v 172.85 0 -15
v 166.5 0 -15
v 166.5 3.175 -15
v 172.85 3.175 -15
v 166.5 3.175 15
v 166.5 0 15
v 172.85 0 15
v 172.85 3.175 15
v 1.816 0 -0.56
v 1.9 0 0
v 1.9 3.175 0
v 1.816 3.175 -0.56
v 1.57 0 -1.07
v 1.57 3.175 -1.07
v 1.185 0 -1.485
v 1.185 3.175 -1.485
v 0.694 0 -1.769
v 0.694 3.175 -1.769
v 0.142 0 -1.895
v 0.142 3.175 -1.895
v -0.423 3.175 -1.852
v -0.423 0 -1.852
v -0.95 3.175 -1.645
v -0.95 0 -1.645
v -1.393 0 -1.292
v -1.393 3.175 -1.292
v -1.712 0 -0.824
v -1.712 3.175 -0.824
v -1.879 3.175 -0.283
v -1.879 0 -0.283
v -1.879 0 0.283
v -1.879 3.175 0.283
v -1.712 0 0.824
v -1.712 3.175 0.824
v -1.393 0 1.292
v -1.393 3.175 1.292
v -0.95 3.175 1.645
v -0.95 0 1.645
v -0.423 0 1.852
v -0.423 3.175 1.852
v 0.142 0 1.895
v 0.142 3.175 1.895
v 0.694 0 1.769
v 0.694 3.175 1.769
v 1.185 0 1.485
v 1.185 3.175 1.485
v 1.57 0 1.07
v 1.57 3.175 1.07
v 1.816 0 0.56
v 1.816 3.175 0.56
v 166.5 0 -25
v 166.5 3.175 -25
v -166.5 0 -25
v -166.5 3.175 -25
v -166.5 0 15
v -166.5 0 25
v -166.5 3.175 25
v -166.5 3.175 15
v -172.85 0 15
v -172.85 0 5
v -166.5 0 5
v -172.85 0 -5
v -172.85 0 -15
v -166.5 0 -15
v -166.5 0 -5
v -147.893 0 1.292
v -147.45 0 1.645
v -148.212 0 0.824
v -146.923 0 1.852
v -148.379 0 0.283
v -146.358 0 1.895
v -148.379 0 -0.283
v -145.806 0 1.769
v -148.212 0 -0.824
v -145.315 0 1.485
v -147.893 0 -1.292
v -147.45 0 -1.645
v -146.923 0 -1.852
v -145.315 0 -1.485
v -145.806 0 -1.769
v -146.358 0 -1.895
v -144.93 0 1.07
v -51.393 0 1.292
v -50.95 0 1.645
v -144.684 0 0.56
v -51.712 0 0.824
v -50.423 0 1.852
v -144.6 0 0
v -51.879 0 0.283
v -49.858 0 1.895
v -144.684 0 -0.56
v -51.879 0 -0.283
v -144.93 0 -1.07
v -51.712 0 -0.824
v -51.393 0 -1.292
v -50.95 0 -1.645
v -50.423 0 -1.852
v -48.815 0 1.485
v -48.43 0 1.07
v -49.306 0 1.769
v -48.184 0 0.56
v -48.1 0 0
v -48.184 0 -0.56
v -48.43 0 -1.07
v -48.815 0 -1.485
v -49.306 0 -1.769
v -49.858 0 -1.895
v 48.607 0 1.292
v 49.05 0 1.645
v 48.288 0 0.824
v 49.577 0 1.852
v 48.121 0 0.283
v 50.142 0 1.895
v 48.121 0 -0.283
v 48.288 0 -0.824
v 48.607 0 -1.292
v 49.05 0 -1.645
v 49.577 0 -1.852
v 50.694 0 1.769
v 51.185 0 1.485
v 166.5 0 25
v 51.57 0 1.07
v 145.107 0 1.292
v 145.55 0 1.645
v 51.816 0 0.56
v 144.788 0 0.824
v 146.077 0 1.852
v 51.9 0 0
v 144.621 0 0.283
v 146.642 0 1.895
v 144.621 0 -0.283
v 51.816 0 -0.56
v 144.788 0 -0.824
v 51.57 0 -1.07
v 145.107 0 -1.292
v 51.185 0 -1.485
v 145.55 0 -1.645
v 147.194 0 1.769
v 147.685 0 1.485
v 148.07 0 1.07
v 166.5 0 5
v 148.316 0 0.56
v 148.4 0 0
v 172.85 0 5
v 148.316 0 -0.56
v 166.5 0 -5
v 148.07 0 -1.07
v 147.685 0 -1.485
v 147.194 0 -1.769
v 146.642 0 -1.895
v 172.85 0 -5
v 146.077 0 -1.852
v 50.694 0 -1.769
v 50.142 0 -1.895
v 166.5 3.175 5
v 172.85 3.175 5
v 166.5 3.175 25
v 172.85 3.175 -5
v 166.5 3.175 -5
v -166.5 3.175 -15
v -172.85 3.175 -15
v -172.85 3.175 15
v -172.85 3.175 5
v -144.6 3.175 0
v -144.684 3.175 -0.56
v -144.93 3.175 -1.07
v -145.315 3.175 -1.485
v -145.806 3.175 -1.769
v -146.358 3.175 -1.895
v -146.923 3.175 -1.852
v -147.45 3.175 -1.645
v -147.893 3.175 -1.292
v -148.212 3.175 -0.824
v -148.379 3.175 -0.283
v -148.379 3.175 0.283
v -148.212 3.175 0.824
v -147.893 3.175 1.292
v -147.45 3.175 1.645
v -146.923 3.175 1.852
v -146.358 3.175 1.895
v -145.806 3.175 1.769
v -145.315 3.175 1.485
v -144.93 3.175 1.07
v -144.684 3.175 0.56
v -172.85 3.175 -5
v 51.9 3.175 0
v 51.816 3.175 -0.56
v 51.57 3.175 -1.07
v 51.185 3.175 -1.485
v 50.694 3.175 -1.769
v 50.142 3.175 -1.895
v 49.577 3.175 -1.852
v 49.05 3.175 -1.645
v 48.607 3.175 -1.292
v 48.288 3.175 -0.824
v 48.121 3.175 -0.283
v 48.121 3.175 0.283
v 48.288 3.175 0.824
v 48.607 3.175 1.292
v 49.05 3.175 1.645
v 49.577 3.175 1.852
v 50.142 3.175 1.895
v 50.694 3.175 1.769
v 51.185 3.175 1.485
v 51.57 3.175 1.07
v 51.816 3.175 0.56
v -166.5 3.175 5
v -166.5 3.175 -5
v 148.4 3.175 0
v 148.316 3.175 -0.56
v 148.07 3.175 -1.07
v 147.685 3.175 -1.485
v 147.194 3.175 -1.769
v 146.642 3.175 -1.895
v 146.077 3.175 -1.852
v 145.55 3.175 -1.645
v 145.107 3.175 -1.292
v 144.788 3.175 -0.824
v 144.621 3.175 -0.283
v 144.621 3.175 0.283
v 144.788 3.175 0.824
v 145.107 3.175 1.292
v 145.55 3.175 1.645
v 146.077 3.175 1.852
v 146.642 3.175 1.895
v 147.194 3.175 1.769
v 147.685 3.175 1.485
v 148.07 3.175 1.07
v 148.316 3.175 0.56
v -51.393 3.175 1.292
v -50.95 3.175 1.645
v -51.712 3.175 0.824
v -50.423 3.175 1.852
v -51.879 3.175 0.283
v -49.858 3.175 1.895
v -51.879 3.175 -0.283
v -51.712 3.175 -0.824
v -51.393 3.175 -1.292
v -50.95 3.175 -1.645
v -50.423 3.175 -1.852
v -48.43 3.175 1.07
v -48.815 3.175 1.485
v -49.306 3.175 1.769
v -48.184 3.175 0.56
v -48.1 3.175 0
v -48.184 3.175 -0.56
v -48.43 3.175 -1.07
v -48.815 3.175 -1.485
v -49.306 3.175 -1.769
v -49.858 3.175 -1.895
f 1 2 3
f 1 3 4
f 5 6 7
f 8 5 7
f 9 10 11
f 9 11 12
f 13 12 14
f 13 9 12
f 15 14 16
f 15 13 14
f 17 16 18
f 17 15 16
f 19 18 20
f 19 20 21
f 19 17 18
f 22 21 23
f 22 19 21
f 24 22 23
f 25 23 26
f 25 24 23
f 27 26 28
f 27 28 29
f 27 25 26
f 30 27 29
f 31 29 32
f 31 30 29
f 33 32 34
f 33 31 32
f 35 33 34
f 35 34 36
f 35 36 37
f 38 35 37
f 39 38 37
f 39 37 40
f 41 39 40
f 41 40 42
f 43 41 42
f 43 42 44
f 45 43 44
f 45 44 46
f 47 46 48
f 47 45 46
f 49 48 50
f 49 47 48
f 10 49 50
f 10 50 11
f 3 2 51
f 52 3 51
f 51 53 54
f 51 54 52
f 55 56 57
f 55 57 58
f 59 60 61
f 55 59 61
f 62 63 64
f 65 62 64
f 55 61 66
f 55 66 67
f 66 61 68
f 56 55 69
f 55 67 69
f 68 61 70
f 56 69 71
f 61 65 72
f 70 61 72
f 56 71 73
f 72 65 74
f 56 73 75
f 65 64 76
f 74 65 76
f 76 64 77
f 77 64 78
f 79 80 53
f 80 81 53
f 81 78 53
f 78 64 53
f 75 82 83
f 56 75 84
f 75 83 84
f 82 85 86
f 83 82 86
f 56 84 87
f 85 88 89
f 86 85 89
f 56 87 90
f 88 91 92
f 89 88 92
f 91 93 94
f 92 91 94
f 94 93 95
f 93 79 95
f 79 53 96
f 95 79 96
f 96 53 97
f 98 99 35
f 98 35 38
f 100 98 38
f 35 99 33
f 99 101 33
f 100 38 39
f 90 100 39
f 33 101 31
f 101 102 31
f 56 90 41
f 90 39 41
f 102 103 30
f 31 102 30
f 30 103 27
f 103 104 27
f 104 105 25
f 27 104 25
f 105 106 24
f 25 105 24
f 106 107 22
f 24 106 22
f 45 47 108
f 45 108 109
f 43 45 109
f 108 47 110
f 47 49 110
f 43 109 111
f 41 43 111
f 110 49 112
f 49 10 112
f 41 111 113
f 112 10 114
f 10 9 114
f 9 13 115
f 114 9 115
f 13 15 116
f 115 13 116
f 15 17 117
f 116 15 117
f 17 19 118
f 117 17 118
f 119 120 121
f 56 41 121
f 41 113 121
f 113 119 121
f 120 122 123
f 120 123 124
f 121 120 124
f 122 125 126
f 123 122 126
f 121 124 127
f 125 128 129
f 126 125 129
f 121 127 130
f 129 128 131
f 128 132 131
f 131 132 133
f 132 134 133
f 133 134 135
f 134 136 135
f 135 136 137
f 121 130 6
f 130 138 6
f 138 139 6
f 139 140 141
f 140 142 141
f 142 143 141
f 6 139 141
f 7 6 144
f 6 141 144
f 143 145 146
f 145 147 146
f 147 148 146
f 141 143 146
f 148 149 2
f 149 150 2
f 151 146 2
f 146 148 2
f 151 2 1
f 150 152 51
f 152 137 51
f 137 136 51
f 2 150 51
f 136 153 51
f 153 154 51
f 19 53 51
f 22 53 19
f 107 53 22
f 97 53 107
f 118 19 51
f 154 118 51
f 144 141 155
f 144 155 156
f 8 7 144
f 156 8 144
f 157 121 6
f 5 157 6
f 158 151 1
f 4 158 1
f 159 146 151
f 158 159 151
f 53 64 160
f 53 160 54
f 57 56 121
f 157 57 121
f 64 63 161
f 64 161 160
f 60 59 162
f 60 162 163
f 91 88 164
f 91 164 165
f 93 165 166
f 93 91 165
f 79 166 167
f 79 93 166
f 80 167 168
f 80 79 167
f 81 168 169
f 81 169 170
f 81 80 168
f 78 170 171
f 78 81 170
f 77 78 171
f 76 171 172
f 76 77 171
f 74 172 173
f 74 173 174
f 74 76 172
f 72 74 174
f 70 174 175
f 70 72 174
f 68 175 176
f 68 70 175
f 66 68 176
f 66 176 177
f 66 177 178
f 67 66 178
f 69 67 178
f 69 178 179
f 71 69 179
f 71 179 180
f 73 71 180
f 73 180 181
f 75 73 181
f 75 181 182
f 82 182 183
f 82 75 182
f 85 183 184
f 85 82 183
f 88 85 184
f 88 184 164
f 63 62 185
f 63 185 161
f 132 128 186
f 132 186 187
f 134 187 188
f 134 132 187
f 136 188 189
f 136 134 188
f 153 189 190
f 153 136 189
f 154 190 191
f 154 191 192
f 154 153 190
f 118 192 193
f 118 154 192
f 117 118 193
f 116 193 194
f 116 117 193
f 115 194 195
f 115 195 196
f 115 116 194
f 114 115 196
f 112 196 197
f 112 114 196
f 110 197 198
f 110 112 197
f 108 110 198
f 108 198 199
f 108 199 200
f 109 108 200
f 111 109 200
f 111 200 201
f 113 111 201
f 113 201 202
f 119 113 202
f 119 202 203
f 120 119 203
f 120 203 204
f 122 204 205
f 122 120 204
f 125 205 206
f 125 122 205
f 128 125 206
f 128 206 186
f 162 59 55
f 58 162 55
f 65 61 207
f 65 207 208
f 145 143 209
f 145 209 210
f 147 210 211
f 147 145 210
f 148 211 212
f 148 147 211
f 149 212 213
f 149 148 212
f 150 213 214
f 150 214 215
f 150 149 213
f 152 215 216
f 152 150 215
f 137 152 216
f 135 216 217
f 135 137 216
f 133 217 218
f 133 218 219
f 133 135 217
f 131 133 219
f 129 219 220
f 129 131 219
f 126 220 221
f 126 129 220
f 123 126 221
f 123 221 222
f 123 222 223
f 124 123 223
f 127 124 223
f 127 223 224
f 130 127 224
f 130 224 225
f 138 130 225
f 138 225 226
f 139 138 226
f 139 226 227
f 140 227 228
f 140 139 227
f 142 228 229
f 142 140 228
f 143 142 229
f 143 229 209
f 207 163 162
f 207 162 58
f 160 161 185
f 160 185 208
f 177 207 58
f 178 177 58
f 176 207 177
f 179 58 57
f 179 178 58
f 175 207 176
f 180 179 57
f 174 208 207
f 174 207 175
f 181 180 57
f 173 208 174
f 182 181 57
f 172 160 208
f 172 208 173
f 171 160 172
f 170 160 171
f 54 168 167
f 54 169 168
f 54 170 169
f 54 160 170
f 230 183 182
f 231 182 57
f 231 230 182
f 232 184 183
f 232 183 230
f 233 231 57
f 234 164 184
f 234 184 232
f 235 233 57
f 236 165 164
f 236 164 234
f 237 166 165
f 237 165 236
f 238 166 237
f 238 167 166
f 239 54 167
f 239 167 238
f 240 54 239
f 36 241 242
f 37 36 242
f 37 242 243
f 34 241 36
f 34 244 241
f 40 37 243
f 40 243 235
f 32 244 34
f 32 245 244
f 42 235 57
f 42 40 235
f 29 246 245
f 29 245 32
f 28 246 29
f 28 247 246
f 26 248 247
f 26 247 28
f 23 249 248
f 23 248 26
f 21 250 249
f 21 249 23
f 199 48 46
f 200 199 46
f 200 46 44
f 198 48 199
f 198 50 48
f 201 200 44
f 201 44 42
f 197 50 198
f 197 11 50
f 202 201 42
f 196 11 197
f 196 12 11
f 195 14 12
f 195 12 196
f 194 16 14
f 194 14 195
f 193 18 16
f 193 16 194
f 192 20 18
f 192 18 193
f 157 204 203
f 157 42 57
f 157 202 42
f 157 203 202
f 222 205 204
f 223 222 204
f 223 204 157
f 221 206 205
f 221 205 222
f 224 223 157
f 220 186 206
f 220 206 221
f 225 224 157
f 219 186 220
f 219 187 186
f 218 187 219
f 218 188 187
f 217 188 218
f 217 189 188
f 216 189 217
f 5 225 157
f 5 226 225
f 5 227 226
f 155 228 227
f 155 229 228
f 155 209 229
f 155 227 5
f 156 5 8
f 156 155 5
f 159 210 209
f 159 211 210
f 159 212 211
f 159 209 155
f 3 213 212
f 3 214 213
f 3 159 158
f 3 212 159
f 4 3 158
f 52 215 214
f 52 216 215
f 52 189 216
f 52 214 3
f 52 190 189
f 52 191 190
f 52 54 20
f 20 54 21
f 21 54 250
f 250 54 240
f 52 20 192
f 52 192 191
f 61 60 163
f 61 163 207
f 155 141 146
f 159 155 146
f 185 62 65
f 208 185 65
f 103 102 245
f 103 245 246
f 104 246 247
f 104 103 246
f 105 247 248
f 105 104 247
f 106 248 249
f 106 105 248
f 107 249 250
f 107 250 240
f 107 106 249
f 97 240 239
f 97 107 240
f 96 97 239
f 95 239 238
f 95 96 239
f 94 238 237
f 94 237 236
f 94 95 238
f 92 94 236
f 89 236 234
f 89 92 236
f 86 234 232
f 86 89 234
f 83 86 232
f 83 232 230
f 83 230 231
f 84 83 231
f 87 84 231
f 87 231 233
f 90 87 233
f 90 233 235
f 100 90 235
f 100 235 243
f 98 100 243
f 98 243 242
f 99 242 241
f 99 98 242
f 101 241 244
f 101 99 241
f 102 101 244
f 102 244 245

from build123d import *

# Parameters (mm, degrees)
SKETCH1_W           = 333
SKETCH1_H           = 50
SKETCH1_R           = 1.9
SKETCH1_W_2         = 6.35
SKETCH1_H_2         = 10
BOSS_EXTRUDE1_DEPTH = 3.175


with BuildPart() as part:
    # Sketch1 → Boss-Extrude1 (new body)
    with BuildSketch(Plane(origin=(0, 0, 0), x_dir=(1, 0, 0), z_dir=(0, 1, 0))):
        Rectangle(SKETCH1_W, SKETCH1_H)
        Circle(SKETCH1_R, mode=Mode.SUBTRACT)
        with Locations((50, 0)):
            Circle(SKETCH1_R, mode=Mode.SUBTRACT)
        with Locations((-50, 0)):
            Circle(SKETCH1_R, mode=Mode.SUBTRACT)
        with Locations((146.5, 0)):
            Circle(SKETCH1_R, mode=Mode.SUBTRACT)
        with Locations((-146.5, 0)):
            Circle(SKETCH1_R, mode=Mode.SUBTRACT)
        with Locations((-169.675, 10)):
            Rectangle(SKETCH1_W_2, SKETCH1_H_2)
        with Locations((169.675, 10)):
            Rectangle(SKETCH1_W_2, SKETCH1_H_2)
        with Locations((169.675, -10)):
            Rectangle(SKETCH1_W_2, SKETCH1_H_2)
        with Locations((-169.675, -10)):
            Rectangle(SKETCH1_W_2, SKETCH1_H_2)
    extrude(amount=BOSS_EXTRUDE1_DEPTH)


solid = part.part
